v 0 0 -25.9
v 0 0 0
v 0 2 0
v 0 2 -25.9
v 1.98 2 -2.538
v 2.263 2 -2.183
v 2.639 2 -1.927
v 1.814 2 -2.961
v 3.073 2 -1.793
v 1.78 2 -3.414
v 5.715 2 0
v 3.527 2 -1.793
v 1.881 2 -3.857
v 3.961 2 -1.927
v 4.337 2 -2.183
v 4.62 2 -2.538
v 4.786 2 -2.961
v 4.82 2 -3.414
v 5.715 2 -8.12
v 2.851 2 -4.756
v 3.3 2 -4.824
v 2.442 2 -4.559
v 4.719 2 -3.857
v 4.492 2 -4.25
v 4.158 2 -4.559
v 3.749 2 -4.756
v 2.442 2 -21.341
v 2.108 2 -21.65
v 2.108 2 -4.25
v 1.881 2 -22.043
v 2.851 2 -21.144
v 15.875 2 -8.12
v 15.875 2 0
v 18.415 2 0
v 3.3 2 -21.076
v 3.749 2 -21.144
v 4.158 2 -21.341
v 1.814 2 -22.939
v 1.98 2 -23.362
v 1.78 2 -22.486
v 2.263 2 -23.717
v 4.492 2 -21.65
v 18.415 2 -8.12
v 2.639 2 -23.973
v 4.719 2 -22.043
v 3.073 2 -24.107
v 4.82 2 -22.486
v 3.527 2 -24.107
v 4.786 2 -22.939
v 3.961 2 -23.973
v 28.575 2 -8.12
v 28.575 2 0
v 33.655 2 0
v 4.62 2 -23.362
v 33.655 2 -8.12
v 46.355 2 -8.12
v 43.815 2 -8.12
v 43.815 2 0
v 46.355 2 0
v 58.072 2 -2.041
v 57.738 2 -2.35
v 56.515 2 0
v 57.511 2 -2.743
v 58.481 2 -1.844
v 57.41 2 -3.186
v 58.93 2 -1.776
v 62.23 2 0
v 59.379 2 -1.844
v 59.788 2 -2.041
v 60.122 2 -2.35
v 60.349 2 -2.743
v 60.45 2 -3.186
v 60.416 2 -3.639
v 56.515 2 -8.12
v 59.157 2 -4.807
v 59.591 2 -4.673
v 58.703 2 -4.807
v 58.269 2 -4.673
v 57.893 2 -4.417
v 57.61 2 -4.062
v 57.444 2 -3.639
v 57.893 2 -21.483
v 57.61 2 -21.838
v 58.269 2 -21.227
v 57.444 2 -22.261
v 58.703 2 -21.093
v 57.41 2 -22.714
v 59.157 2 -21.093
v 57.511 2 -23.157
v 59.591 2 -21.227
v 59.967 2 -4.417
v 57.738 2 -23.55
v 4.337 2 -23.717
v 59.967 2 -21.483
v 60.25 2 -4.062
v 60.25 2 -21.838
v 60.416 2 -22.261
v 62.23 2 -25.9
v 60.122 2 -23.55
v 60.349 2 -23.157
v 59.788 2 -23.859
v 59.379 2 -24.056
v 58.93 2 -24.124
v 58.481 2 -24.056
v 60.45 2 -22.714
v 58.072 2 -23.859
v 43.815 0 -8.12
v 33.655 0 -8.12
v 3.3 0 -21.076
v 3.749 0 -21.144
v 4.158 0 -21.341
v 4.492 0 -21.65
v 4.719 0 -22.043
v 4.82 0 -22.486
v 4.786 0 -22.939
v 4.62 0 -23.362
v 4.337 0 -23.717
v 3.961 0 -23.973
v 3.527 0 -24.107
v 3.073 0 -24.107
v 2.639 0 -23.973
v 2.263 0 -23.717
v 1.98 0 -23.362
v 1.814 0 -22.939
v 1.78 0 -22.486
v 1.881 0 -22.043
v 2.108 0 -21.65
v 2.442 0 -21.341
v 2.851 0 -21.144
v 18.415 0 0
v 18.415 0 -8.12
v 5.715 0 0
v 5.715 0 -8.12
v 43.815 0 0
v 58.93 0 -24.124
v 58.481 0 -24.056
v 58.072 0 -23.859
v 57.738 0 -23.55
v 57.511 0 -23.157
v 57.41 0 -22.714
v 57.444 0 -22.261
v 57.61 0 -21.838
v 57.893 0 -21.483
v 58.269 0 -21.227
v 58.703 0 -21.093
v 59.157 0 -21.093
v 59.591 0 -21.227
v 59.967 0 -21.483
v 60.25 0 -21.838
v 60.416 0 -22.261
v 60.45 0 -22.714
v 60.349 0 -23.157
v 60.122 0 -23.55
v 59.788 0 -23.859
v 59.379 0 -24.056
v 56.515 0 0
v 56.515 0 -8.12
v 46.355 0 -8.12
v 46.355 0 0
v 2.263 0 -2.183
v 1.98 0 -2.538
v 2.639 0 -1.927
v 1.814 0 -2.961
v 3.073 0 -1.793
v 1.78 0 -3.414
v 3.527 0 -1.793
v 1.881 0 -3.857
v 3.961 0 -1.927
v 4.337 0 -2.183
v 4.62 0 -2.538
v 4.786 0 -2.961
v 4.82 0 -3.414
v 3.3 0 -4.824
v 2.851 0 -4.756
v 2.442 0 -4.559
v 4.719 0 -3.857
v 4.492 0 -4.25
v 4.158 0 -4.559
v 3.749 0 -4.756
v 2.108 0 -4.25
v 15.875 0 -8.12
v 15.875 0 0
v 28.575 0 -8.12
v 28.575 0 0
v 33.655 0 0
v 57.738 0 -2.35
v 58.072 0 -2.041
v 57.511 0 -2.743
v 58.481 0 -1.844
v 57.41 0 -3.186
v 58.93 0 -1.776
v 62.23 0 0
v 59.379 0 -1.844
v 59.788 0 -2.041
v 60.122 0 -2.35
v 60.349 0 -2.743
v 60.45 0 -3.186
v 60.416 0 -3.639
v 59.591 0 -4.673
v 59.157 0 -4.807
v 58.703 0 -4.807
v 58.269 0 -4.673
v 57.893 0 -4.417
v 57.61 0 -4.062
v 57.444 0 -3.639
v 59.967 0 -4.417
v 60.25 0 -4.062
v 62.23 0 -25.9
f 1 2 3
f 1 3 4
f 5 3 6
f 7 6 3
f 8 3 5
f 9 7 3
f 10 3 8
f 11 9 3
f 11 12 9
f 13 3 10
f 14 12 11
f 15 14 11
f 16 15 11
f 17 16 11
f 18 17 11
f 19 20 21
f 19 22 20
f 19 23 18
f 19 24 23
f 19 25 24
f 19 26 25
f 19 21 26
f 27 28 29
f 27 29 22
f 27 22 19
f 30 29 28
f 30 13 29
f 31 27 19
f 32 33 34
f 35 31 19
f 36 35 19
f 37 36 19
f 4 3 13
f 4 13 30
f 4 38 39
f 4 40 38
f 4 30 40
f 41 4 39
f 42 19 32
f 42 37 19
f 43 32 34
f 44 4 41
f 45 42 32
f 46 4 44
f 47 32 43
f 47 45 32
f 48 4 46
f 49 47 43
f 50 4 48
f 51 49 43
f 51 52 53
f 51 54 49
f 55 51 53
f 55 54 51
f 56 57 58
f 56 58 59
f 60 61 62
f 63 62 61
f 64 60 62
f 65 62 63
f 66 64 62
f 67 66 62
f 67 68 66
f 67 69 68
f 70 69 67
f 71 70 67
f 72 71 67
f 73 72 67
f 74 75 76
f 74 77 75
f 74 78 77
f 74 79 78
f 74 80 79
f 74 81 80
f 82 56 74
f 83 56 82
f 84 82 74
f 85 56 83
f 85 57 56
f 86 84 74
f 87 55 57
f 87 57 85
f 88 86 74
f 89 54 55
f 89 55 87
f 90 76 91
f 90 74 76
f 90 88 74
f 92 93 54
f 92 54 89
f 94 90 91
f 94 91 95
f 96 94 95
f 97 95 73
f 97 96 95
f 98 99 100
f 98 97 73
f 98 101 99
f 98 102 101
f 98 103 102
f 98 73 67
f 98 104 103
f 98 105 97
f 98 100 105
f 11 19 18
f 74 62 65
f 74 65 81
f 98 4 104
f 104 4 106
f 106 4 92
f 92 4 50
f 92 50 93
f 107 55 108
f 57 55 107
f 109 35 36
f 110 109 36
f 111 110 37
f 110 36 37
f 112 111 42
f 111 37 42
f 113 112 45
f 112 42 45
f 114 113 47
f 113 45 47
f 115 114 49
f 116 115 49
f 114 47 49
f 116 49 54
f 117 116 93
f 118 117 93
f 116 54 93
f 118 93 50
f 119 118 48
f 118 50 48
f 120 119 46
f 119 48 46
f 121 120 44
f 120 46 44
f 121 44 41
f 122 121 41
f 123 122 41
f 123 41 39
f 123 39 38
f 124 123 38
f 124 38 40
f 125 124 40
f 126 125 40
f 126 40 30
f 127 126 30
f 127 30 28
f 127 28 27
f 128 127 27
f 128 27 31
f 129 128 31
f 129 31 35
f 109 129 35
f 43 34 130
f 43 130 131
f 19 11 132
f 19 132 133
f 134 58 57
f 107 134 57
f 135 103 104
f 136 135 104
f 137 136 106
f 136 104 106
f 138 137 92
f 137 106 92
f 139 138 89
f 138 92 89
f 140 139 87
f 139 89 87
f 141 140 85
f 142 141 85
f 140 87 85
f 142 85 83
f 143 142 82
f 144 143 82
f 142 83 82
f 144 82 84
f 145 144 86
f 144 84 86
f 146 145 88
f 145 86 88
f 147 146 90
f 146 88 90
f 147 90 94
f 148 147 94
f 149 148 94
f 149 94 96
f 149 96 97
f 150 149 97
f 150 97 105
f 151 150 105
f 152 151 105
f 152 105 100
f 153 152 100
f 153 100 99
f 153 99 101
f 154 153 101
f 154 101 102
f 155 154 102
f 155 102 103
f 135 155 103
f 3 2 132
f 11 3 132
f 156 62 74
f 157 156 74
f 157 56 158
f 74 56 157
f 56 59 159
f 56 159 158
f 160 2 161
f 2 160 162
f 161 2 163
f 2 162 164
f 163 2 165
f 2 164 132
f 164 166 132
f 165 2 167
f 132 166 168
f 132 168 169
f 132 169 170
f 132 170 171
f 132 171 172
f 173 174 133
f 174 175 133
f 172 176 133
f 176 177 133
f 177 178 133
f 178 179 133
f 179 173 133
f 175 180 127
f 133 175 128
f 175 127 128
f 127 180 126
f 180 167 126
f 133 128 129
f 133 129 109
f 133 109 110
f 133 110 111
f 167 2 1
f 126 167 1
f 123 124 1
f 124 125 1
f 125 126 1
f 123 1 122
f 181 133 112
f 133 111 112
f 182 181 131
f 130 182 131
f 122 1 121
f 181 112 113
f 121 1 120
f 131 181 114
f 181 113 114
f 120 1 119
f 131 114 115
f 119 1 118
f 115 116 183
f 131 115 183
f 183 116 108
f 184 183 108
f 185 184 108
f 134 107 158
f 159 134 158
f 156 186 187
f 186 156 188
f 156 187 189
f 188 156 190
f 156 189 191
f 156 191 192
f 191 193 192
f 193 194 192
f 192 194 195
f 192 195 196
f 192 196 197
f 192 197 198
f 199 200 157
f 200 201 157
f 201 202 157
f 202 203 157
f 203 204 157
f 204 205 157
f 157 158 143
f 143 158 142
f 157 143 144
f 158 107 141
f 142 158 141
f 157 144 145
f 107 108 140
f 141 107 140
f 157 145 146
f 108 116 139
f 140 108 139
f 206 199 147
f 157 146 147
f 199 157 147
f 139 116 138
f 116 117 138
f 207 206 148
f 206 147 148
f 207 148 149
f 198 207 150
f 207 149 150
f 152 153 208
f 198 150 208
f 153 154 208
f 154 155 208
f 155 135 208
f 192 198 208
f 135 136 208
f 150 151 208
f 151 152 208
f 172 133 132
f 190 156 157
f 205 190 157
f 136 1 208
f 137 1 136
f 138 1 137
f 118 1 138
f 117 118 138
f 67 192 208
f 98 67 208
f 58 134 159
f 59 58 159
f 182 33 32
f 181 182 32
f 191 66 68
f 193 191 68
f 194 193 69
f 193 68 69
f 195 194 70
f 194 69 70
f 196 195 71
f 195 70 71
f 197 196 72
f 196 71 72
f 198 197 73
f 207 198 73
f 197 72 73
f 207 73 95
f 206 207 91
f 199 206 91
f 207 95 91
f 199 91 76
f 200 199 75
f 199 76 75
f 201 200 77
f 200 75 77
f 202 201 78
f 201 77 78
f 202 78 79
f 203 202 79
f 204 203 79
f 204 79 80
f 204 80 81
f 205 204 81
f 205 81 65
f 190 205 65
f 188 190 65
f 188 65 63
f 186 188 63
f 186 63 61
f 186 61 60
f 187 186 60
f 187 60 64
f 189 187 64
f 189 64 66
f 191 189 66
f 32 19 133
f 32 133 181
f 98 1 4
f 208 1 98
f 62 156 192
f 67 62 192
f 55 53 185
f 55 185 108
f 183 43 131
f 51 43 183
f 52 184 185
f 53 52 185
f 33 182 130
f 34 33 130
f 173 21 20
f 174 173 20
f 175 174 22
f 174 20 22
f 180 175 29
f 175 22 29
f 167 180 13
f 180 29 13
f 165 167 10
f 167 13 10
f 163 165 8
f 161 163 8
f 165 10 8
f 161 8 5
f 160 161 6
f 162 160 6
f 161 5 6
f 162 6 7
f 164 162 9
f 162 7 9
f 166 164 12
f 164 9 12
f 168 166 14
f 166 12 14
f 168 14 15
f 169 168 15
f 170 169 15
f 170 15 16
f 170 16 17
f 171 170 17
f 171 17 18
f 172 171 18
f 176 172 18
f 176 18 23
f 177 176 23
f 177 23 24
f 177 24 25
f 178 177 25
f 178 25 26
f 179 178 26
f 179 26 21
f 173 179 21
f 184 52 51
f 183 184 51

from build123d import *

# Parameters (mm, degrees)
SKETCH1_W           = 62.23
SKETCH1_H           = 25.9
BOSS_EXTRUDE1_DEPTH = 2
SKETCH2_R           = 1.524
SKETCH2_W           = 10.16
SKETCH2_H           = 8.12
CUT_EXTRUDE1_DEPTH  = 10


with BuildPart() as part:
    # Sketch1 → Boss-Extrude1 (new body)
    with BuildSketch(Plane(origin=(0, 0, 0), x_dir=(1, 0, 0), z_dir=(0, 1, 0))):
        with Locations((31.115, 12.95)):
            Rectangle(SKETCH1_W, SKETCH1_H)
    extrude(amount=BOSS_EXTRUDE1_DEPTH)

    # Sketch2 → Cut-Extrude1 (cut)
    with BuildSketch(Plane(origin=(0, 2, 0), x_dir=(1, 0, 0), z_dir=(0, 1, 0))):
        with Locations(Location((3.3, 22.6, 0), (0, 0, 270))):
            Circle(SKETCH2_R)
        with Locations(Location((3.3, 3.3, 0), (0, 0, 90))):
            Circle(SKETCH2_R)
        with Locations(Location((58.93, 3.3, 0), (0, 0, 270))):
            Circle(SKETCH2_R)
        with Locations(Location((58.93, 22.6, 0), (0, 0, 90))):
            Circle(SKETCH2_R)
        with Locations((38.735, 4.06)):
            Rectangle(SKETCH2_W, SKETCH2_H)
        with Locations((10.795, 4.06)):
            Rectangle(SKETCH2_W, SKETCH2_H)
        with Locations((51.435, 4.06)):
            Rectangle(SKETCH2_W, SKETCH2_H)
        with Locations((23.495, 4.06)):
            Rectangle(SKETCH2_W, SKETCH2_H)
    extrude(amount=-CUT_EXTRUDE1_DEPTH, mode=Mode.SUBTRACT)


solid = part.part
